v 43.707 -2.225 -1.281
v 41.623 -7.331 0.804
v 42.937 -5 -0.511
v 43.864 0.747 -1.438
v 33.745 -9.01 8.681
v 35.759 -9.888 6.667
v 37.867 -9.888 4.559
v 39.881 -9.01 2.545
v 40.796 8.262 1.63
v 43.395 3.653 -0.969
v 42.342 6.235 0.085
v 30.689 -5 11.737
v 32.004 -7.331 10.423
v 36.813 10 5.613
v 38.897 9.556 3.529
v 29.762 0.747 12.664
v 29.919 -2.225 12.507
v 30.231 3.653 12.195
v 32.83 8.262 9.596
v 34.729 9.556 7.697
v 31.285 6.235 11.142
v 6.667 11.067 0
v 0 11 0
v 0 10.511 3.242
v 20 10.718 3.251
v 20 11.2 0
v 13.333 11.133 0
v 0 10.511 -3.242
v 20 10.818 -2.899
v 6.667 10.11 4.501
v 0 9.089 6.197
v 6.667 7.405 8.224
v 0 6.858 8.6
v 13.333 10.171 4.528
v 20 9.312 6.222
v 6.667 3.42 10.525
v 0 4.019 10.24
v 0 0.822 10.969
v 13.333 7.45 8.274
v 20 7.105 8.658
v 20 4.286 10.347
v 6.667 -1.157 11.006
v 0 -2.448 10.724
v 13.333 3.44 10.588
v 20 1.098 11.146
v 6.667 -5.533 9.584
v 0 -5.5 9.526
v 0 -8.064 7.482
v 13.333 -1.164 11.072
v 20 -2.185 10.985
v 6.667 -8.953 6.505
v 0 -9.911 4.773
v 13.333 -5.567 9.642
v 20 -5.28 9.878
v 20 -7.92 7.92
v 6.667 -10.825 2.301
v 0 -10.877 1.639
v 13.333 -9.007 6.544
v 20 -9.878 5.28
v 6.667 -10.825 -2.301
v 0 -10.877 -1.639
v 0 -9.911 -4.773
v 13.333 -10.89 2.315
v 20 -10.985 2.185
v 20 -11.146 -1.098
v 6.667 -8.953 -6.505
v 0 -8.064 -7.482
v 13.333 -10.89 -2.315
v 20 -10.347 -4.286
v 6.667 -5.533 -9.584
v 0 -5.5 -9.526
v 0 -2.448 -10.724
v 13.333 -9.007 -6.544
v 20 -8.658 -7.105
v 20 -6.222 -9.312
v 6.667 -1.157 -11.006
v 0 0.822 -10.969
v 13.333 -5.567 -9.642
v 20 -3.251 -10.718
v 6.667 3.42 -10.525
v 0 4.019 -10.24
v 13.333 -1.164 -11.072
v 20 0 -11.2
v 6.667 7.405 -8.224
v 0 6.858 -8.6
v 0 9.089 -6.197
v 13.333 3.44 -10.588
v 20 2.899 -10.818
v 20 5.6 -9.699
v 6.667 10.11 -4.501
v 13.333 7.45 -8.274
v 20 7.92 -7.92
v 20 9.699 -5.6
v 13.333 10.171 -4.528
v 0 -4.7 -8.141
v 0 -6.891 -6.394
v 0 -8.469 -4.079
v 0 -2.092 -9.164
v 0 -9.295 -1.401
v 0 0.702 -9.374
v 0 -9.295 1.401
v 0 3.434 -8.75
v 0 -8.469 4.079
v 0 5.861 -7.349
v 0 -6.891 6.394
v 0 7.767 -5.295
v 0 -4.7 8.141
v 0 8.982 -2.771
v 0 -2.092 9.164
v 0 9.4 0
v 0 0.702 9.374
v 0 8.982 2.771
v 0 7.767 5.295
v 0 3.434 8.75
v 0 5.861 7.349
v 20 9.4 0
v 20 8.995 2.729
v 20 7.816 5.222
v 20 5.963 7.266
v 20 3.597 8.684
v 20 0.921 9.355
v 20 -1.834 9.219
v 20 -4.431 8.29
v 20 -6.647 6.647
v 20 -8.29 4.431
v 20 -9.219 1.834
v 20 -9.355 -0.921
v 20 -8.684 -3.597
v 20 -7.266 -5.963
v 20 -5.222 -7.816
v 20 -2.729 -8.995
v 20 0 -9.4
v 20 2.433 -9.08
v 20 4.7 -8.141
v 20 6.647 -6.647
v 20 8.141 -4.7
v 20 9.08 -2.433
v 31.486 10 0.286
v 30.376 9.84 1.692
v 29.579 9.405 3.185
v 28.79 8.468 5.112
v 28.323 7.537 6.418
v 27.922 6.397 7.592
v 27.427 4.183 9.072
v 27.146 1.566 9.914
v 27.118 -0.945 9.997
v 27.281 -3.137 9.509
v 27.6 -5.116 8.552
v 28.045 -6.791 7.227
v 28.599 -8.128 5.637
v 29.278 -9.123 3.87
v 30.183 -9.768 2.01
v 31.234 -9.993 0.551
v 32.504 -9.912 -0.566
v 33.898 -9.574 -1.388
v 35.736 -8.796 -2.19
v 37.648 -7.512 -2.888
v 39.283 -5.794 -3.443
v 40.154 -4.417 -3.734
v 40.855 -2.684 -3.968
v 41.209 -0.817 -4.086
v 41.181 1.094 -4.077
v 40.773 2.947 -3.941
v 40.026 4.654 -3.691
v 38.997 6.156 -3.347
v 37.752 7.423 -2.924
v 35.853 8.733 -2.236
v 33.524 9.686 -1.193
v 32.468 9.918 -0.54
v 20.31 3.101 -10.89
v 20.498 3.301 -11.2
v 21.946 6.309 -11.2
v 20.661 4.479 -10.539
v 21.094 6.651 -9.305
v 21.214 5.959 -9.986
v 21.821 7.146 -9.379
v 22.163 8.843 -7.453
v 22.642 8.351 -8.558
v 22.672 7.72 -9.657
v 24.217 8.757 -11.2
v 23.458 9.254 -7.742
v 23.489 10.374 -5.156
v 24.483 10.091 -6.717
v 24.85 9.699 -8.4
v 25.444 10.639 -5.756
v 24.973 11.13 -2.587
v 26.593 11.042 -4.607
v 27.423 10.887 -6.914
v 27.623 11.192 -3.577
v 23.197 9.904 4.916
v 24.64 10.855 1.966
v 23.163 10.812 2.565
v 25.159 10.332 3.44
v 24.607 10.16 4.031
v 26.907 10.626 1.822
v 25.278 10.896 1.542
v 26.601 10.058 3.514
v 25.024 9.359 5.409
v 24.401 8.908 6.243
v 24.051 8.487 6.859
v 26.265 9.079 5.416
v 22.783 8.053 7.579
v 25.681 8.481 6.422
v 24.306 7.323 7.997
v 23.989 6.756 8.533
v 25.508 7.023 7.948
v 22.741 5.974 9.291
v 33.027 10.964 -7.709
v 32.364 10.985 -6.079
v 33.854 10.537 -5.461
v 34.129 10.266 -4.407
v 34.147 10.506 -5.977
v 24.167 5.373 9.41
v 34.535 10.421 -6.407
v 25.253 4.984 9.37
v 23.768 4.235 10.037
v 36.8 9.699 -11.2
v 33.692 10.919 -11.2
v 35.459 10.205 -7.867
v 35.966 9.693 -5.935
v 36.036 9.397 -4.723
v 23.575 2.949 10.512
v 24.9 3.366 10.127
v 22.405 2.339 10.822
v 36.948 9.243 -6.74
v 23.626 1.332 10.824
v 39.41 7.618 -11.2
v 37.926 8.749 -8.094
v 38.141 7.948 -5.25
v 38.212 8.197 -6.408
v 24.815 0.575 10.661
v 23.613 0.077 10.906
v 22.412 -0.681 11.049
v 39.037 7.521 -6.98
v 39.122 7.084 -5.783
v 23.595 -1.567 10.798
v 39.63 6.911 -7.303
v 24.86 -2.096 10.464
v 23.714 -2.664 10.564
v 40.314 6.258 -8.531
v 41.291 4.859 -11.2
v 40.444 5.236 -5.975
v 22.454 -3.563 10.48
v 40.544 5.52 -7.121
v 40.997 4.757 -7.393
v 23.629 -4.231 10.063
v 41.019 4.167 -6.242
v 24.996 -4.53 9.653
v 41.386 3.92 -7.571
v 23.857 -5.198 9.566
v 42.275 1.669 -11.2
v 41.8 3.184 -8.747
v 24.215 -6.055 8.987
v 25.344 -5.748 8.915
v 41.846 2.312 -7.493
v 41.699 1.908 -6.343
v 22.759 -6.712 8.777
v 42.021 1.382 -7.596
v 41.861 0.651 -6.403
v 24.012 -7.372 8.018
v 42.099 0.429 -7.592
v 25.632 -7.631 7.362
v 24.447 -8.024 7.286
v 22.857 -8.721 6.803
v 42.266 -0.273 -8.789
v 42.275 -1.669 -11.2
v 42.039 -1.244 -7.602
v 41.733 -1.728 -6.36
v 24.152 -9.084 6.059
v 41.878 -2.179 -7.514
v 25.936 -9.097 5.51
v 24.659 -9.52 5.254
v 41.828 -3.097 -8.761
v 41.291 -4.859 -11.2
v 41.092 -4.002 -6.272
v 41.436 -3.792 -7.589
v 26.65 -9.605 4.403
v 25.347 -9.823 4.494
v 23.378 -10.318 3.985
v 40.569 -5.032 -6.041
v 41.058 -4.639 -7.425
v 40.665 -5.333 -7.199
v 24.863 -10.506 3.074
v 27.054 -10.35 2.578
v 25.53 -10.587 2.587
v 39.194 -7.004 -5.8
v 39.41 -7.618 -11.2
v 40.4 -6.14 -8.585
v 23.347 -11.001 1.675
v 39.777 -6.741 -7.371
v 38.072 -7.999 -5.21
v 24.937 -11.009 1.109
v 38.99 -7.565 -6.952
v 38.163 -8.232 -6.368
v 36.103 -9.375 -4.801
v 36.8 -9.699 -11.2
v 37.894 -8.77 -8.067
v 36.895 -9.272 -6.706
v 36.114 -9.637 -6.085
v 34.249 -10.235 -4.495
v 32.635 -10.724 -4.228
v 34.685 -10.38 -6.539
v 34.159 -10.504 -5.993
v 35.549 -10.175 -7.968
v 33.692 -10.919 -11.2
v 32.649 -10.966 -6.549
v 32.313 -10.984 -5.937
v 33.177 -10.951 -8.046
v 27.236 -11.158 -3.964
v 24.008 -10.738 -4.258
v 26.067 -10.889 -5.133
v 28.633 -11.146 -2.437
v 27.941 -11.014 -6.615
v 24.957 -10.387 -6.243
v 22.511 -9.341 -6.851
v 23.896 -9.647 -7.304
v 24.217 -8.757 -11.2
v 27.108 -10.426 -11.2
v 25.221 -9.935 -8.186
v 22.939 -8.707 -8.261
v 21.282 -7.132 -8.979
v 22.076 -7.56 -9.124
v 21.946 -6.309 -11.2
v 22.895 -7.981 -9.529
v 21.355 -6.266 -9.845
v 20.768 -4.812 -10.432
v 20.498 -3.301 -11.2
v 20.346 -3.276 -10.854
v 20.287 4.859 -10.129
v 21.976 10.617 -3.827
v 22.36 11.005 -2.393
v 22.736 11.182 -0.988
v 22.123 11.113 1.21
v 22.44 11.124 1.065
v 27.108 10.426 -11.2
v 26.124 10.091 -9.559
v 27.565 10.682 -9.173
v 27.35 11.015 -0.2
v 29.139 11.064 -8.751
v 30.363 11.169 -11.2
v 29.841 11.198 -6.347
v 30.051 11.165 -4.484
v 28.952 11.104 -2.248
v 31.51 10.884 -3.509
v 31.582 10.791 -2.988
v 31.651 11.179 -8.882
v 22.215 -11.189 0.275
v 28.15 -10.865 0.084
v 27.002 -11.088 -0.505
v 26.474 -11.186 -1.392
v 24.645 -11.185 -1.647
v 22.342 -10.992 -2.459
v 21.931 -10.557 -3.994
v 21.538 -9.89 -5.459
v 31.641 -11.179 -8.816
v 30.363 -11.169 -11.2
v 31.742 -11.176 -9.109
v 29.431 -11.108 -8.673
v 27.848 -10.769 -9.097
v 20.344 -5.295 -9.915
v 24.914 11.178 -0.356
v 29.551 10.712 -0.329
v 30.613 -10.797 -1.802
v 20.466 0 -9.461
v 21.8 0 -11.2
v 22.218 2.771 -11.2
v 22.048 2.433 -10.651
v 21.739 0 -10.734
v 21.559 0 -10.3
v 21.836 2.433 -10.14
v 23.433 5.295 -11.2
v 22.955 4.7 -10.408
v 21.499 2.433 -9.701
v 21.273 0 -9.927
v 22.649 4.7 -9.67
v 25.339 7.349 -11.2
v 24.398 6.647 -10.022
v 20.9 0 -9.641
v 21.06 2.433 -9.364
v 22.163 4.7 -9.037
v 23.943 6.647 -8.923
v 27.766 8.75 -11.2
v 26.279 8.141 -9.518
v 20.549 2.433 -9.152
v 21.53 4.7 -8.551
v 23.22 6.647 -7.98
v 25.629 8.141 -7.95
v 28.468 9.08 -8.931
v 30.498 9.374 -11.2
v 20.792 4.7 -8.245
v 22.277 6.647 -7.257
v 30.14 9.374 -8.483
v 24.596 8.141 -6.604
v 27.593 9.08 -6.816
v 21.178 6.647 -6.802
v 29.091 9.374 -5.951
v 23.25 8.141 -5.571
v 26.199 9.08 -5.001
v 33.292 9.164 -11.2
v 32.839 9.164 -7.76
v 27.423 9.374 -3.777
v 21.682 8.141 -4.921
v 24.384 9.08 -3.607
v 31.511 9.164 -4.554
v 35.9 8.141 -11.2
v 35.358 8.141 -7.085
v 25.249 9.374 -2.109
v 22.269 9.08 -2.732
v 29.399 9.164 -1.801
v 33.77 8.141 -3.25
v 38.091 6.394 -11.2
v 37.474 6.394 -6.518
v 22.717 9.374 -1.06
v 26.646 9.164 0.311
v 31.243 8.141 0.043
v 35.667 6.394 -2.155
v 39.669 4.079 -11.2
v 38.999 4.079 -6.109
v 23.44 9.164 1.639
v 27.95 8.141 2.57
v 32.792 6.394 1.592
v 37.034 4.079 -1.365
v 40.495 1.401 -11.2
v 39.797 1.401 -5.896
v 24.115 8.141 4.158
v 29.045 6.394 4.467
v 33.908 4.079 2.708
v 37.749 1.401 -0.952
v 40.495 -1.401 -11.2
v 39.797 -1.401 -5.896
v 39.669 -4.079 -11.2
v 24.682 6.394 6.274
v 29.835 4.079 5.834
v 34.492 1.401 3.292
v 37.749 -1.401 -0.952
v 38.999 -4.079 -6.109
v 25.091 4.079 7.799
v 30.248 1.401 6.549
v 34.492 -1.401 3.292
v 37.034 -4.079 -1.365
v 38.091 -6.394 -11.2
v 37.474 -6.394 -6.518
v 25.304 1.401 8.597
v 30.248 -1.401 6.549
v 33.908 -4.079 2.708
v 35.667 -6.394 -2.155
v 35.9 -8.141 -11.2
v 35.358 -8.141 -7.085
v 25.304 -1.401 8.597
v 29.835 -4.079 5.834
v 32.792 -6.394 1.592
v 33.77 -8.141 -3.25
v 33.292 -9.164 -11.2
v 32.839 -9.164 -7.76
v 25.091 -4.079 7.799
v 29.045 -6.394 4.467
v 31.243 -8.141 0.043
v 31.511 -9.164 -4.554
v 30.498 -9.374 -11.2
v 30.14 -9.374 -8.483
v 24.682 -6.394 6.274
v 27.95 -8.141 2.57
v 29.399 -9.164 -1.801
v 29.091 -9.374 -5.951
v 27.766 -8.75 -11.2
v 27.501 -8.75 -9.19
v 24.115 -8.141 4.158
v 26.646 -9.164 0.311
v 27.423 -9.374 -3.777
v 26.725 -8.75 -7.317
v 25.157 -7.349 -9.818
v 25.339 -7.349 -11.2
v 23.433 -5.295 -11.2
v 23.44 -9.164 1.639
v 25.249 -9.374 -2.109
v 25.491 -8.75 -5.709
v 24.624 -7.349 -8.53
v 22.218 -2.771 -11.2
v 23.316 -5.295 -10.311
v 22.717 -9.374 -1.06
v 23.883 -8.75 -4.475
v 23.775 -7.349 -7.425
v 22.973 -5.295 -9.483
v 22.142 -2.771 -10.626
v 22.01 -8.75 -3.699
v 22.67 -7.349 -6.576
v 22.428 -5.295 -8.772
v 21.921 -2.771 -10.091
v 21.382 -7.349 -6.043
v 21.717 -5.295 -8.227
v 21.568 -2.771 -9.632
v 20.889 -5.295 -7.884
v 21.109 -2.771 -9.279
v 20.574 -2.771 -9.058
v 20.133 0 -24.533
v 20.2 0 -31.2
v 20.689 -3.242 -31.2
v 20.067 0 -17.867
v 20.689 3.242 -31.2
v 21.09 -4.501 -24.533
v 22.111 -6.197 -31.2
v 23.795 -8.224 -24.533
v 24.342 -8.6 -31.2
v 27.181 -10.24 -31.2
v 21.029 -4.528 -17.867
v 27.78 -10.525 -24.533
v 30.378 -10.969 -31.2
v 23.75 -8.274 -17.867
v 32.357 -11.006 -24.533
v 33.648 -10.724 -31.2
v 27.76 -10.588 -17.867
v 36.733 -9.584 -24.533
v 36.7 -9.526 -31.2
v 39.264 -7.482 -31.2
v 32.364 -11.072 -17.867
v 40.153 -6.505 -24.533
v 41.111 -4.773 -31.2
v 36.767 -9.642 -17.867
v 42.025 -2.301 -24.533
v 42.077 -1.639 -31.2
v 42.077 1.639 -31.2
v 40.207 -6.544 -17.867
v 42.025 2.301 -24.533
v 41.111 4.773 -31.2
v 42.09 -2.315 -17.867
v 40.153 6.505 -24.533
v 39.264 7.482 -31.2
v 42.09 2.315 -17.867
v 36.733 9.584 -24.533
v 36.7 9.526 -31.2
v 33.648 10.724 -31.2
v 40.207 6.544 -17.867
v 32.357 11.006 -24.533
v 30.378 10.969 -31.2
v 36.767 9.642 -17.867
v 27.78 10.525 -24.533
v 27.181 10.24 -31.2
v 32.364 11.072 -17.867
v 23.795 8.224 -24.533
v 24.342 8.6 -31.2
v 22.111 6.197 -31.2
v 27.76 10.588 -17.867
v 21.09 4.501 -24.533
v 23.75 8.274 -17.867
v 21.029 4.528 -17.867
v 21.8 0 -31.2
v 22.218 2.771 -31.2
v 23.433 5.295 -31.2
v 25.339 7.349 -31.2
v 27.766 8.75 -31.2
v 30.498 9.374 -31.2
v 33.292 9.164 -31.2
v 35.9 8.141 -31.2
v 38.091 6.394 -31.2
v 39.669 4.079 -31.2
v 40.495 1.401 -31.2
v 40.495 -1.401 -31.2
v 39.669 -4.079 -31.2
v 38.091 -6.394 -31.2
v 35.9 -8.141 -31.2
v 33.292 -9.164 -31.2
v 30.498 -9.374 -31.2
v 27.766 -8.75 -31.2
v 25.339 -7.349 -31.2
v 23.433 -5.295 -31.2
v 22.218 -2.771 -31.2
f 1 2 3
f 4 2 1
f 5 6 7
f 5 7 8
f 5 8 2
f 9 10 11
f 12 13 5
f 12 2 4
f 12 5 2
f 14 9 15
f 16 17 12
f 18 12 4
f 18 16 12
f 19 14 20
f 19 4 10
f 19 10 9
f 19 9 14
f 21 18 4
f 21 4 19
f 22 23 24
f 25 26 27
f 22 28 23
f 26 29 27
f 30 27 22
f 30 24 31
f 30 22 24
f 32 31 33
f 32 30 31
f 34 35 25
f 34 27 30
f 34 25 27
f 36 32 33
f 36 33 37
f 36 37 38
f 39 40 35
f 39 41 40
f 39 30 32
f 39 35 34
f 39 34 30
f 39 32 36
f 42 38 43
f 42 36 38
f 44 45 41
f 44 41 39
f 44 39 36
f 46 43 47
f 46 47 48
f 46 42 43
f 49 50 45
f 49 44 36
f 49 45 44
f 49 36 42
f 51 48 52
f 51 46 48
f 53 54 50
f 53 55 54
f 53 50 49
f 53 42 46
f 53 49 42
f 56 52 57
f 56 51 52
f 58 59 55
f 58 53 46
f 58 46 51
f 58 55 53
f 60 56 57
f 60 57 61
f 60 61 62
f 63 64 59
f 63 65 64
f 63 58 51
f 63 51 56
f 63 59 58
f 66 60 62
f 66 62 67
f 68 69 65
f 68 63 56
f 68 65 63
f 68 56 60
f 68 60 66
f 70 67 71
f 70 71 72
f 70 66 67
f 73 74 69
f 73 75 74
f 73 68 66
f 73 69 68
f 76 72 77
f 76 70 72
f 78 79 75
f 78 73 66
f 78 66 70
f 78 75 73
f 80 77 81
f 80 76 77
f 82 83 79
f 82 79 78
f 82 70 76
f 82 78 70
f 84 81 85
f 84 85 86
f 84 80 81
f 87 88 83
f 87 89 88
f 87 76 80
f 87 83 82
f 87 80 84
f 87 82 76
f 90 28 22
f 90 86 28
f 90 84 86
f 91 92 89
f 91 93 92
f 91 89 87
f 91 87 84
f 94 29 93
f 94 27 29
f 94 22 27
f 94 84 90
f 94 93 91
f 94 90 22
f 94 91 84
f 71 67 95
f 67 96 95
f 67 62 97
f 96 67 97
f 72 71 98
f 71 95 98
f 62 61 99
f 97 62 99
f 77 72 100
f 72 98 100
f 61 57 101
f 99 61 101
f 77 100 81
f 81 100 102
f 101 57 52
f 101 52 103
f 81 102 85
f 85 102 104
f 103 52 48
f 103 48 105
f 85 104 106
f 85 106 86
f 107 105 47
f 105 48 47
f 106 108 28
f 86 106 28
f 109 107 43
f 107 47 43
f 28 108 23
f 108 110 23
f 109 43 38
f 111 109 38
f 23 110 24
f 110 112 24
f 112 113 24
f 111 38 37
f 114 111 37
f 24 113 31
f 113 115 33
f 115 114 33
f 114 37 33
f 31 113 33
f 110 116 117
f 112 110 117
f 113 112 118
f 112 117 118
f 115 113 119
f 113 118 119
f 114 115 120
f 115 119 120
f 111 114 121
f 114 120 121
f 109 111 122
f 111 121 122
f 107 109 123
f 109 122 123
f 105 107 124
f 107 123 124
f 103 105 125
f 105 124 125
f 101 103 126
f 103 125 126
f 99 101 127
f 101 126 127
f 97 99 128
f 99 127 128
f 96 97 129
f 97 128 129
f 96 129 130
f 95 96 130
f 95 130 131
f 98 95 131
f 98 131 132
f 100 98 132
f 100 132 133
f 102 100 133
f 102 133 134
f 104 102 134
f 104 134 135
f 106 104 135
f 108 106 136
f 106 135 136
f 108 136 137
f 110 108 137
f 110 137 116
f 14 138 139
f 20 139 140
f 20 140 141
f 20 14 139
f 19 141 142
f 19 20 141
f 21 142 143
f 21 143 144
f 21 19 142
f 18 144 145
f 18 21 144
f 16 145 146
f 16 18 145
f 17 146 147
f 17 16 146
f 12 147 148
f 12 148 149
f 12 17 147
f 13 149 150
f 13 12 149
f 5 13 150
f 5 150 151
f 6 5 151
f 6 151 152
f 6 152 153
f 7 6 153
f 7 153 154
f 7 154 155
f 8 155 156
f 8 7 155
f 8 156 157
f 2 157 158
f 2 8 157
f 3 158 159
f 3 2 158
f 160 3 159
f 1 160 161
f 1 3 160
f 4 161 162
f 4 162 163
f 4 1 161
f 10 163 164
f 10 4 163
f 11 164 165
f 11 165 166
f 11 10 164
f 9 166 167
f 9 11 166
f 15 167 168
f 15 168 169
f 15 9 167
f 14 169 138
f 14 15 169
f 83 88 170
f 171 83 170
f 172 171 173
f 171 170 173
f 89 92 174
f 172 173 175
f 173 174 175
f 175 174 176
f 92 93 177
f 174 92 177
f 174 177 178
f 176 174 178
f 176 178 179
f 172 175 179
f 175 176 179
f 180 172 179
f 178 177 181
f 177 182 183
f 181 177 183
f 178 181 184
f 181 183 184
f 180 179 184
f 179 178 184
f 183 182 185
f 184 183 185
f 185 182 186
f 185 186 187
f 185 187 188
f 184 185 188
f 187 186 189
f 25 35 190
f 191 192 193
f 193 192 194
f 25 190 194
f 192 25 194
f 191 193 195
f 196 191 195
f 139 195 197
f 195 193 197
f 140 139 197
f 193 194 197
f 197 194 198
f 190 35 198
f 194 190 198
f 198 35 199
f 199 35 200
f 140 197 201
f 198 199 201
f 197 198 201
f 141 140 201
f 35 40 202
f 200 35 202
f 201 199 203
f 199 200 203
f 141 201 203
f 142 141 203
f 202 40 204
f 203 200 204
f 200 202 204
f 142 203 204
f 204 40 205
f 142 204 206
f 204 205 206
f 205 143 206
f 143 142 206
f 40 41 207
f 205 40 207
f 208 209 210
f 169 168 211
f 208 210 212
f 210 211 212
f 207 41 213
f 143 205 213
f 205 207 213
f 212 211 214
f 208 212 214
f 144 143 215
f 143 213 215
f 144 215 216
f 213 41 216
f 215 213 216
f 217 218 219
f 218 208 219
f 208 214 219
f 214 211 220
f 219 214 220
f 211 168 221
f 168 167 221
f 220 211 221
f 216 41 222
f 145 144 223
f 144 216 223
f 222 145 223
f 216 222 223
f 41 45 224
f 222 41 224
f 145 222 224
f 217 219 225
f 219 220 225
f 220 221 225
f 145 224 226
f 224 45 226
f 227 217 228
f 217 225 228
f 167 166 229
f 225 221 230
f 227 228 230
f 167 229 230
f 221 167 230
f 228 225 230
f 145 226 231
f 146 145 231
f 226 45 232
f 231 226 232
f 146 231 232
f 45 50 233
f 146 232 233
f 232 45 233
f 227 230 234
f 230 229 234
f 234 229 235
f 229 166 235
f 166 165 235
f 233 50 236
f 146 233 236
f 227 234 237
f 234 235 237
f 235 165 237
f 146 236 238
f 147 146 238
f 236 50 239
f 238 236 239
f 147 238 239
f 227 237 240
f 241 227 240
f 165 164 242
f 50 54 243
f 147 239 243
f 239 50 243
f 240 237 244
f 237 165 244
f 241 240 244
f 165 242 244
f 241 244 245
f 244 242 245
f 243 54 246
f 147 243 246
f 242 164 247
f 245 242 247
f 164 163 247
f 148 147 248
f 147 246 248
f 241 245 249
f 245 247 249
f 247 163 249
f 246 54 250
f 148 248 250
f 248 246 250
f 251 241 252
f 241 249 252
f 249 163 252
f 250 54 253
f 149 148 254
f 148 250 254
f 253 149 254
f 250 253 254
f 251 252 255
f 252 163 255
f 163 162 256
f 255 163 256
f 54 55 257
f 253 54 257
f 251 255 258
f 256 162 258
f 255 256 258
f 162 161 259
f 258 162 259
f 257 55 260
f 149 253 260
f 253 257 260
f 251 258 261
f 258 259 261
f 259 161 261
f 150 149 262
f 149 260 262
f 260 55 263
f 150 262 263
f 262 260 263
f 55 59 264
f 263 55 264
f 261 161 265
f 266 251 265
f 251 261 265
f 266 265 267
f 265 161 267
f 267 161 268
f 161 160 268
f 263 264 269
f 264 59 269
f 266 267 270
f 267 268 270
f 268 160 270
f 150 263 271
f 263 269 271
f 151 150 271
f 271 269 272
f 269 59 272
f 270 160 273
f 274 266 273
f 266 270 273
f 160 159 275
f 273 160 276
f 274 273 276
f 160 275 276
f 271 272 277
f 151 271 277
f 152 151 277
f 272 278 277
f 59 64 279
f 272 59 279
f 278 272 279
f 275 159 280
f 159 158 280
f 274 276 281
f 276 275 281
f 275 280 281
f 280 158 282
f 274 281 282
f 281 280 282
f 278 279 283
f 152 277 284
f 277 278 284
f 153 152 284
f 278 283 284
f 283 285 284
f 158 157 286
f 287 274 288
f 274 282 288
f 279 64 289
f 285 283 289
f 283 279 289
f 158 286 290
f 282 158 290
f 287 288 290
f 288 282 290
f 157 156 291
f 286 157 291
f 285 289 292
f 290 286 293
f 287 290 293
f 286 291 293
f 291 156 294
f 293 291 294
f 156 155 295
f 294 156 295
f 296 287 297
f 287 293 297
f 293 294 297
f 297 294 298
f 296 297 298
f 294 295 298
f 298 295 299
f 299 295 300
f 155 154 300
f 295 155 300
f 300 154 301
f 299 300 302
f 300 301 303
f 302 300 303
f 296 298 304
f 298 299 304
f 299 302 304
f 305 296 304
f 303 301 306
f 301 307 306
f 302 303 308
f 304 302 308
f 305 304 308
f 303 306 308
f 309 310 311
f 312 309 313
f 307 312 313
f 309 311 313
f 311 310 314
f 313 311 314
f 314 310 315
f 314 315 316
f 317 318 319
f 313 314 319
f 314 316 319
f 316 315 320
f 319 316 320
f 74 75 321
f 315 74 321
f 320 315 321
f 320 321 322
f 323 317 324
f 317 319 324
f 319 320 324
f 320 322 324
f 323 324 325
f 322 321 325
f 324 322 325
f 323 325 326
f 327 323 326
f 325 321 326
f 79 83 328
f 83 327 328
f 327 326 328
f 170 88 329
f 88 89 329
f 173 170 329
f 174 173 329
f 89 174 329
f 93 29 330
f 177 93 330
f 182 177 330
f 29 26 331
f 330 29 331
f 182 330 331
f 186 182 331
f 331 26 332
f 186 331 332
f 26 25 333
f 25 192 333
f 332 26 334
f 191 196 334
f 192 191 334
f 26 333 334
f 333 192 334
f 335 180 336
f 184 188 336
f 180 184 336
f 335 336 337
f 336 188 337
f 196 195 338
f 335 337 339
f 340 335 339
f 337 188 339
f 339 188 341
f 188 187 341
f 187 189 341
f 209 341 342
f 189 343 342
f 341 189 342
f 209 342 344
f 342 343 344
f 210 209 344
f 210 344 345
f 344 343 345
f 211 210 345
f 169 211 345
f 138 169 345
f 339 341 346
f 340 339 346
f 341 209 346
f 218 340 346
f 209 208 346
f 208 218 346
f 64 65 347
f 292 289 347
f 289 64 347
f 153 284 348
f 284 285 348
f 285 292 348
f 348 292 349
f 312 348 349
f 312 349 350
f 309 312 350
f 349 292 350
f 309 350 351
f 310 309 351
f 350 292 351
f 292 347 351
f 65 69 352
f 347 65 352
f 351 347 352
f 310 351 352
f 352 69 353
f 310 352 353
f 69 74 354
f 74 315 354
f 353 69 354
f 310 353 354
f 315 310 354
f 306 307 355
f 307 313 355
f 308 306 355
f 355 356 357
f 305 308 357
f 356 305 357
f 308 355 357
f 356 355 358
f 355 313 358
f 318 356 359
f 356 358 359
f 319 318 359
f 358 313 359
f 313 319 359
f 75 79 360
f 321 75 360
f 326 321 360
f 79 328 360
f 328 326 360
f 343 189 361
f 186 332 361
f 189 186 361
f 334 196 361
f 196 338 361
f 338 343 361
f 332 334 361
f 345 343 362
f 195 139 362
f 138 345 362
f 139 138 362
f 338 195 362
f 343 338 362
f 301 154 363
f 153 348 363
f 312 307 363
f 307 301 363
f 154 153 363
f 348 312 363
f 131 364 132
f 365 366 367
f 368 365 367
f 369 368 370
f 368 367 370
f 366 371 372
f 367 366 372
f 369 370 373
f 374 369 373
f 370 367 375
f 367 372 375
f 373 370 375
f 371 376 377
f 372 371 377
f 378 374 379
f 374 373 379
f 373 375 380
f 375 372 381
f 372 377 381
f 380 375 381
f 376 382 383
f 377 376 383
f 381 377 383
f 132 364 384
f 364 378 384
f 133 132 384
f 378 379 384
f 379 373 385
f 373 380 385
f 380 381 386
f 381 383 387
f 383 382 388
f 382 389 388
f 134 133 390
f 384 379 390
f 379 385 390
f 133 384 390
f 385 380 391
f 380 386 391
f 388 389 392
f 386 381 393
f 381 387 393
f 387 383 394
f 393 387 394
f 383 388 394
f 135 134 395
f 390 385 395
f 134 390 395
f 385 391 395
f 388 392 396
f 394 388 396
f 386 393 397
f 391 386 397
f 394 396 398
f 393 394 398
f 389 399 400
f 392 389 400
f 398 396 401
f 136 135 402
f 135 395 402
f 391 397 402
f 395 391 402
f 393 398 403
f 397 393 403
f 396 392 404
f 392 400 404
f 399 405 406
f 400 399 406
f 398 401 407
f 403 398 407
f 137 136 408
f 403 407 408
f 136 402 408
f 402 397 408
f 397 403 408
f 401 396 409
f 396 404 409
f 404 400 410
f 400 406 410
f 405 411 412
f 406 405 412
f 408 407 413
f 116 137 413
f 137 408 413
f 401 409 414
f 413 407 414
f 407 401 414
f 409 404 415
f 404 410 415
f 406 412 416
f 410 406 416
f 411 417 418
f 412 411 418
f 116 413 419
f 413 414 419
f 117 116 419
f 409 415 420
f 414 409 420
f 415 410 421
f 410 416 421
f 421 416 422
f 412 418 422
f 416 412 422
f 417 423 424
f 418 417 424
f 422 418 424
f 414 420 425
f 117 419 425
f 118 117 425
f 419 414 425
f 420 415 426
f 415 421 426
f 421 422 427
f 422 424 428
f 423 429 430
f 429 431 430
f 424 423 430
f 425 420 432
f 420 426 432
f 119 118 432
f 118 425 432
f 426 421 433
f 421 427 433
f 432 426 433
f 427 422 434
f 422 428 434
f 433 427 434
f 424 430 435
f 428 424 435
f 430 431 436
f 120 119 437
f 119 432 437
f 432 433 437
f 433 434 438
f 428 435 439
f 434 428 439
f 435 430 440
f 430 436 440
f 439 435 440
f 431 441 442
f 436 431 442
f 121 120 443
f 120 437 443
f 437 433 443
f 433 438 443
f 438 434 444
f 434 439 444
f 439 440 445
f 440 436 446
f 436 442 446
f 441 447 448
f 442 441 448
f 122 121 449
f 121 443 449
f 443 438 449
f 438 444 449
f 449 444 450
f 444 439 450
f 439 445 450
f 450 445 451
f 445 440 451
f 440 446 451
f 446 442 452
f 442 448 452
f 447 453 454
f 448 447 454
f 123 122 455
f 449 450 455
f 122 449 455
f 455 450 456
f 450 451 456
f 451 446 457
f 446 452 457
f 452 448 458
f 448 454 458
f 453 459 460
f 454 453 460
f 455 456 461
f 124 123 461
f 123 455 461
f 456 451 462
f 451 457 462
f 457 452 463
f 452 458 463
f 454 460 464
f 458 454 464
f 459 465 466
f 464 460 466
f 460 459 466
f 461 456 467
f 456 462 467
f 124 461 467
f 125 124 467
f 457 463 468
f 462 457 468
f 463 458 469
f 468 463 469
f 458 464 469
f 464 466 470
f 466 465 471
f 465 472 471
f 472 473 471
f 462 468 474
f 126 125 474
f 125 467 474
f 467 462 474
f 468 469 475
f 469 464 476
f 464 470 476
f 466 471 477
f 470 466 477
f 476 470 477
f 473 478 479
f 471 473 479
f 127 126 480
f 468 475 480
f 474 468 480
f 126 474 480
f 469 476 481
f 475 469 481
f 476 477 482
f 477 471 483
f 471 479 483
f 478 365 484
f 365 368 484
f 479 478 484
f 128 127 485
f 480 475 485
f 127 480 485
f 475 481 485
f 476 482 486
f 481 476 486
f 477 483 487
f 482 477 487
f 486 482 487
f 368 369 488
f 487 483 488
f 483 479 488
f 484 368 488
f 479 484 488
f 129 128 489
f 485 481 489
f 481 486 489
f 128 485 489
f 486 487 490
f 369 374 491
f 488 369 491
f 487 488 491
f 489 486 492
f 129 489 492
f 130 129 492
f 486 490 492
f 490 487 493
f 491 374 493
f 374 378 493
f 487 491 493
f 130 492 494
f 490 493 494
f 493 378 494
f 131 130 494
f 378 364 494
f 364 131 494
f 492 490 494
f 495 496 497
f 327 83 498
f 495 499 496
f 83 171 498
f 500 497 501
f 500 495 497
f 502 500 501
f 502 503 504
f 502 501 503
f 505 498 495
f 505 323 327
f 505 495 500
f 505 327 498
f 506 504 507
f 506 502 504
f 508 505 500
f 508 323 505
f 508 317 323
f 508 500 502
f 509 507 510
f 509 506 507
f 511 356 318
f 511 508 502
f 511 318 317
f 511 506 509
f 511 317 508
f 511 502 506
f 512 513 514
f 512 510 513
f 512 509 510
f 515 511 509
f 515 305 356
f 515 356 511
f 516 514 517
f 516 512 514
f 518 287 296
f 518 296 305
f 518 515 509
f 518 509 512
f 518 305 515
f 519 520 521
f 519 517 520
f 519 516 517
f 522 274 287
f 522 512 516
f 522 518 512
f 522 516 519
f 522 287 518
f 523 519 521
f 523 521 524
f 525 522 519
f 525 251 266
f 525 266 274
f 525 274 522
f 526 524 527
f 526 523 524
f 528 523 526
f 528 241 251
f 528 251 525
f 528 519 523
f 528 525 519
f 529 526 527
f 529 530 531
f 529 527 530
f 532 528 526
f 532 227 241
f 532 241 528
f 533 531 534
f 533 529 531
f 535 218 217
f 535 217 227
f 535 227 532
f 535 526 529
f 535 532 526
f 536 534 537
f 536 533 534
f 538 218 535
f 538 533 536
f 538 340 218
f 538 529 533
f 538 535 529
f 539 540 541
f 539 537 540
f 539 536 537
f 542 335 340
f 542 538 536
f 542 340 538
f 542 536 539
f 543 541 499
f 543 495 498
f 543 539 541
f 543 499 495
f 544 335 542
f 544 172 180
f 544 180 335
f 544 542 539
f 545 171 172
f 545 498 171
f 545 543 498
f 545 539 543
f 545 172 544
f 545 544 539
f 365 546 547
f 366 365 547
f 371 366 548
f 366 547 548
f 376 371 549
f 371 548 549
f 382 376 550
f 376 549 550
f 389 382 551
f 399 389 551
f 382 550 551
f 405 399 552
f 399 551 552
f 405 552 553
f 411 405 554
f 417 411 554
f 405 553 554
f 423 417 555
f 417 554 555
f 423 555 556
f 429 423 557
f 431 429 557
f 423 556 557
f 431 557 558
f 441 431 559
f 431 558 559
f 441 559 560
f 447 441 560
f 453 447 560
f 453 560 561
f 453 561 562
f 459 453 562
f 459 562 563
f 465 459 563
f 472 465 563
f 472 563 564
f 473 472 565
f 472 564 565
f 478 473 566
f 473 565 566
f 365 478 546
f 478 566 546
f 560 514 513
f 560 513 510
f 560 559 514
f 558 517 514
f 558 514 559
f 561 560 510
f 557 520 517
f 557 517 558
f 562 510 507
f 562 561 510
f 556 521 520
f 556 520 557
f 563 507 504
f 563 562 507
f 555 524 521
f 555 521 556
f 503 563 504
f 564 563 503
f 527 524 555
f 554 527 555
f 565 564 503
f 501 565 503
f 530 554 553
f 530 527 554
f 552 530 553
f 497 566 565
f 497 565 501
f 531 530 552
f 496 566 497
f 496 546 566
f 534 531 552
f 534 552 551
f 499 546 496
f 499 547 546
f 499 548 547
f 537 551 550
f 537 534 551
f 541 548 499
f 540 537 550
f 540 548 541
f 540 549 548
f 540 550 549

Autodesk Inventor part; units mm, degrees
ref_plane "XZ Plane" through (0, 0, 0) normal (0, 1, 0) x (-1, 0, 0)
ref_plane "XY Plane" through (0, 0, 0) normal (0, 0, 1) x (1, 0, 0)
sketch "Sketch1" plane through (0, 0, 0) normal (0, 0, 1) x (1, 0, 0)
  line L0 (0, 0) -> (0, 11) construction
  line L1 (0, 0) -> (20, 0) construction
  line L2 (20, 0) -> (20, 11.2) construction
  line L3 (0, 11) -> (20, 11.2)
  line L4 (0, 9.4) -> (20, 9.4)
  line L5 (20, 9.4) -> (20, 11.2)
  line L6 (0, 9.4) -> (0, 11)
  dimension "d0" = 11
  dimension "d1" = 20
  dimension "d2" = 11.2
  dimension "d3" = 1.6
sketch "Sketch1 outline for Revolution1" plane through (0, 0, 0) normal (0, 0, 1) x (1, 0, 0)
  line L0 (20, 9.4) -> (20, 11.2)
  line L1 (0, 9.4) -> (20, 9.4)
  line L2 (0, 11) -> (0, 9.4)
  line L3 (20, 11.2) -> (0, 11)
revolve "Revolution1" add sketch "Sketch1 outline for Revolution1" angle 360 about axis through (0, 0, 0) along (1, 0, 0)
sketch "Sketch2" plane through (20, 0, 0) normal (1, 0, 0) x (0, 0, -1)
  line L0 (0, 0) -> (11.2, 0) construction
  circle A0 centre (0, 0) radius 11.2 construction
  line L1 (11.2, 0) -> (11.2, 11.2) construction
  circle A1 centre (0, 0) radius 11.2
  circle A2 centre (0, 0) radius 9.4 projected
  dimension "d5" = 11.2
sketch "Sketch2 outline for Revolution2" plane through (20, 0, 0) normal (1, 0, 0) x (0, 0, -1)
  circle A0 centre (0, 0) radius 11.2
  circle A1 centre (0, 0) radius 9.4
revolve "Revolution2" add sketch "Sketch2 outline for Revolution2" angle 90 about axis through (20, 0, -11.2) along (0, 1, 0)
sketch "Sketch3" plane through (0, 0, 0) normal (0, 1, 0) x (-1, 0, 0)
  line L0 (-42.4, -11.2) -> (-20, -11.2) construction
  line L1 (-31.2, -11.2) -> (-31.2, -31.2) construction
  line L2 (-31.2, -11.2) -> (-11.2, -11.2) construction
  line L3 (-31.2, -31.2) -> (-20.2, -31.2) construction
  line L4 (-20.2, -31.2) -> (-20, -11.2)
  line L5 (-20.2, -31.2) -> (-21.8, -31.2)
  line L6 (-21.8, -31.2) -> (-21.8, -11.2)
  line L7 (-20, -11.2) -> (-21.8, -11.2)
  point P0 (0, 0)
  dimension "d7" = 20
  dimension "d8" = 90
  dimension "d9" = 11
  dimension "d10" = 1.6
sketch "Sketch3 outline for Revolution3" plane through (0, 0, 0) normal (0, 1, 0) x (-1, 0, 0)
  line L0 (-20.2, -31.2) -> (-20, -11.2)
  line L1 (-21.8, -31.2) -> (-20.2, -31.2)
  line L2 (-21.8, -11.2) -> (-21.8, -31.2)
  line L3 (-20, -11.2) -> (-21.8, -11.2)
revolve "Revolution3" add sketch "Sketch3 outline for Revolution3" angle 360 about axis through (31.2, 0, -11.2) along (0, 0, -1)
ref_plane "Work Plane2" through (21.213203, 0, 21.213203) normal (0.7071068, 0, 0.7071068) x (0, 1, 0)
ref_plane "Work Plane1" through (0, 0, 0) normal (0.7071068, 0, 0.7071068) x (0, 1, 0)
sketch "Sketch4" plane through (21.213203, 0, 21.213203) normal (0.7071068, 0, 0.7071068) x (0, 1, 0)
  ellipse E0 centre (0, -14.142136) end of major axis (11.2, -14.142136) minor radius 7.919596 construction
  ellipse E1 centre (0, -29.981328) end of major axis (11.2, -29.981328) minor radius 7.919596 construction
  line L0 (0, -14.142136) -> (0, -29.981328) construction
  circle A0 centre (0, -22.061732) radius 10
  point P0 (0, 0)
  dimension "d14" = 20
sketch "Sketch4 outline for Extrusion1" plane through (21.213203, 0, 21.213203) normal (0.7071068, 0, 0.7071068) x (0, 1, 0)
  circle A0 centre (0, -22.061732) radius 10
extrude "Extrusion1" add sketch "Sketch4 outline for Extrusion1" against normal up to surface
equation "\"d0\" = 0.5 * TMStart"
equation "\"d1\" = TDepth"
equation "\"d2\" = 0.5 * TMEnd"
equation "\"d3\" = WallT"
equation "\"d5\" = BendR"
equation "\"d7\" = TDepth"
equation "\"d9\" = 0.5 * TMStart"
equation "\"d10\" = WallT"
equation "\"TMStart\" = 22"
equation "\"TMEnd\" = 22.4"
equation "\"WallT\" = 1.6"
equation "\"TDepth\" = 20"
equation "\"BendR\" = 0.5 * TMEnd"
properties part number "MtoM90degree"
